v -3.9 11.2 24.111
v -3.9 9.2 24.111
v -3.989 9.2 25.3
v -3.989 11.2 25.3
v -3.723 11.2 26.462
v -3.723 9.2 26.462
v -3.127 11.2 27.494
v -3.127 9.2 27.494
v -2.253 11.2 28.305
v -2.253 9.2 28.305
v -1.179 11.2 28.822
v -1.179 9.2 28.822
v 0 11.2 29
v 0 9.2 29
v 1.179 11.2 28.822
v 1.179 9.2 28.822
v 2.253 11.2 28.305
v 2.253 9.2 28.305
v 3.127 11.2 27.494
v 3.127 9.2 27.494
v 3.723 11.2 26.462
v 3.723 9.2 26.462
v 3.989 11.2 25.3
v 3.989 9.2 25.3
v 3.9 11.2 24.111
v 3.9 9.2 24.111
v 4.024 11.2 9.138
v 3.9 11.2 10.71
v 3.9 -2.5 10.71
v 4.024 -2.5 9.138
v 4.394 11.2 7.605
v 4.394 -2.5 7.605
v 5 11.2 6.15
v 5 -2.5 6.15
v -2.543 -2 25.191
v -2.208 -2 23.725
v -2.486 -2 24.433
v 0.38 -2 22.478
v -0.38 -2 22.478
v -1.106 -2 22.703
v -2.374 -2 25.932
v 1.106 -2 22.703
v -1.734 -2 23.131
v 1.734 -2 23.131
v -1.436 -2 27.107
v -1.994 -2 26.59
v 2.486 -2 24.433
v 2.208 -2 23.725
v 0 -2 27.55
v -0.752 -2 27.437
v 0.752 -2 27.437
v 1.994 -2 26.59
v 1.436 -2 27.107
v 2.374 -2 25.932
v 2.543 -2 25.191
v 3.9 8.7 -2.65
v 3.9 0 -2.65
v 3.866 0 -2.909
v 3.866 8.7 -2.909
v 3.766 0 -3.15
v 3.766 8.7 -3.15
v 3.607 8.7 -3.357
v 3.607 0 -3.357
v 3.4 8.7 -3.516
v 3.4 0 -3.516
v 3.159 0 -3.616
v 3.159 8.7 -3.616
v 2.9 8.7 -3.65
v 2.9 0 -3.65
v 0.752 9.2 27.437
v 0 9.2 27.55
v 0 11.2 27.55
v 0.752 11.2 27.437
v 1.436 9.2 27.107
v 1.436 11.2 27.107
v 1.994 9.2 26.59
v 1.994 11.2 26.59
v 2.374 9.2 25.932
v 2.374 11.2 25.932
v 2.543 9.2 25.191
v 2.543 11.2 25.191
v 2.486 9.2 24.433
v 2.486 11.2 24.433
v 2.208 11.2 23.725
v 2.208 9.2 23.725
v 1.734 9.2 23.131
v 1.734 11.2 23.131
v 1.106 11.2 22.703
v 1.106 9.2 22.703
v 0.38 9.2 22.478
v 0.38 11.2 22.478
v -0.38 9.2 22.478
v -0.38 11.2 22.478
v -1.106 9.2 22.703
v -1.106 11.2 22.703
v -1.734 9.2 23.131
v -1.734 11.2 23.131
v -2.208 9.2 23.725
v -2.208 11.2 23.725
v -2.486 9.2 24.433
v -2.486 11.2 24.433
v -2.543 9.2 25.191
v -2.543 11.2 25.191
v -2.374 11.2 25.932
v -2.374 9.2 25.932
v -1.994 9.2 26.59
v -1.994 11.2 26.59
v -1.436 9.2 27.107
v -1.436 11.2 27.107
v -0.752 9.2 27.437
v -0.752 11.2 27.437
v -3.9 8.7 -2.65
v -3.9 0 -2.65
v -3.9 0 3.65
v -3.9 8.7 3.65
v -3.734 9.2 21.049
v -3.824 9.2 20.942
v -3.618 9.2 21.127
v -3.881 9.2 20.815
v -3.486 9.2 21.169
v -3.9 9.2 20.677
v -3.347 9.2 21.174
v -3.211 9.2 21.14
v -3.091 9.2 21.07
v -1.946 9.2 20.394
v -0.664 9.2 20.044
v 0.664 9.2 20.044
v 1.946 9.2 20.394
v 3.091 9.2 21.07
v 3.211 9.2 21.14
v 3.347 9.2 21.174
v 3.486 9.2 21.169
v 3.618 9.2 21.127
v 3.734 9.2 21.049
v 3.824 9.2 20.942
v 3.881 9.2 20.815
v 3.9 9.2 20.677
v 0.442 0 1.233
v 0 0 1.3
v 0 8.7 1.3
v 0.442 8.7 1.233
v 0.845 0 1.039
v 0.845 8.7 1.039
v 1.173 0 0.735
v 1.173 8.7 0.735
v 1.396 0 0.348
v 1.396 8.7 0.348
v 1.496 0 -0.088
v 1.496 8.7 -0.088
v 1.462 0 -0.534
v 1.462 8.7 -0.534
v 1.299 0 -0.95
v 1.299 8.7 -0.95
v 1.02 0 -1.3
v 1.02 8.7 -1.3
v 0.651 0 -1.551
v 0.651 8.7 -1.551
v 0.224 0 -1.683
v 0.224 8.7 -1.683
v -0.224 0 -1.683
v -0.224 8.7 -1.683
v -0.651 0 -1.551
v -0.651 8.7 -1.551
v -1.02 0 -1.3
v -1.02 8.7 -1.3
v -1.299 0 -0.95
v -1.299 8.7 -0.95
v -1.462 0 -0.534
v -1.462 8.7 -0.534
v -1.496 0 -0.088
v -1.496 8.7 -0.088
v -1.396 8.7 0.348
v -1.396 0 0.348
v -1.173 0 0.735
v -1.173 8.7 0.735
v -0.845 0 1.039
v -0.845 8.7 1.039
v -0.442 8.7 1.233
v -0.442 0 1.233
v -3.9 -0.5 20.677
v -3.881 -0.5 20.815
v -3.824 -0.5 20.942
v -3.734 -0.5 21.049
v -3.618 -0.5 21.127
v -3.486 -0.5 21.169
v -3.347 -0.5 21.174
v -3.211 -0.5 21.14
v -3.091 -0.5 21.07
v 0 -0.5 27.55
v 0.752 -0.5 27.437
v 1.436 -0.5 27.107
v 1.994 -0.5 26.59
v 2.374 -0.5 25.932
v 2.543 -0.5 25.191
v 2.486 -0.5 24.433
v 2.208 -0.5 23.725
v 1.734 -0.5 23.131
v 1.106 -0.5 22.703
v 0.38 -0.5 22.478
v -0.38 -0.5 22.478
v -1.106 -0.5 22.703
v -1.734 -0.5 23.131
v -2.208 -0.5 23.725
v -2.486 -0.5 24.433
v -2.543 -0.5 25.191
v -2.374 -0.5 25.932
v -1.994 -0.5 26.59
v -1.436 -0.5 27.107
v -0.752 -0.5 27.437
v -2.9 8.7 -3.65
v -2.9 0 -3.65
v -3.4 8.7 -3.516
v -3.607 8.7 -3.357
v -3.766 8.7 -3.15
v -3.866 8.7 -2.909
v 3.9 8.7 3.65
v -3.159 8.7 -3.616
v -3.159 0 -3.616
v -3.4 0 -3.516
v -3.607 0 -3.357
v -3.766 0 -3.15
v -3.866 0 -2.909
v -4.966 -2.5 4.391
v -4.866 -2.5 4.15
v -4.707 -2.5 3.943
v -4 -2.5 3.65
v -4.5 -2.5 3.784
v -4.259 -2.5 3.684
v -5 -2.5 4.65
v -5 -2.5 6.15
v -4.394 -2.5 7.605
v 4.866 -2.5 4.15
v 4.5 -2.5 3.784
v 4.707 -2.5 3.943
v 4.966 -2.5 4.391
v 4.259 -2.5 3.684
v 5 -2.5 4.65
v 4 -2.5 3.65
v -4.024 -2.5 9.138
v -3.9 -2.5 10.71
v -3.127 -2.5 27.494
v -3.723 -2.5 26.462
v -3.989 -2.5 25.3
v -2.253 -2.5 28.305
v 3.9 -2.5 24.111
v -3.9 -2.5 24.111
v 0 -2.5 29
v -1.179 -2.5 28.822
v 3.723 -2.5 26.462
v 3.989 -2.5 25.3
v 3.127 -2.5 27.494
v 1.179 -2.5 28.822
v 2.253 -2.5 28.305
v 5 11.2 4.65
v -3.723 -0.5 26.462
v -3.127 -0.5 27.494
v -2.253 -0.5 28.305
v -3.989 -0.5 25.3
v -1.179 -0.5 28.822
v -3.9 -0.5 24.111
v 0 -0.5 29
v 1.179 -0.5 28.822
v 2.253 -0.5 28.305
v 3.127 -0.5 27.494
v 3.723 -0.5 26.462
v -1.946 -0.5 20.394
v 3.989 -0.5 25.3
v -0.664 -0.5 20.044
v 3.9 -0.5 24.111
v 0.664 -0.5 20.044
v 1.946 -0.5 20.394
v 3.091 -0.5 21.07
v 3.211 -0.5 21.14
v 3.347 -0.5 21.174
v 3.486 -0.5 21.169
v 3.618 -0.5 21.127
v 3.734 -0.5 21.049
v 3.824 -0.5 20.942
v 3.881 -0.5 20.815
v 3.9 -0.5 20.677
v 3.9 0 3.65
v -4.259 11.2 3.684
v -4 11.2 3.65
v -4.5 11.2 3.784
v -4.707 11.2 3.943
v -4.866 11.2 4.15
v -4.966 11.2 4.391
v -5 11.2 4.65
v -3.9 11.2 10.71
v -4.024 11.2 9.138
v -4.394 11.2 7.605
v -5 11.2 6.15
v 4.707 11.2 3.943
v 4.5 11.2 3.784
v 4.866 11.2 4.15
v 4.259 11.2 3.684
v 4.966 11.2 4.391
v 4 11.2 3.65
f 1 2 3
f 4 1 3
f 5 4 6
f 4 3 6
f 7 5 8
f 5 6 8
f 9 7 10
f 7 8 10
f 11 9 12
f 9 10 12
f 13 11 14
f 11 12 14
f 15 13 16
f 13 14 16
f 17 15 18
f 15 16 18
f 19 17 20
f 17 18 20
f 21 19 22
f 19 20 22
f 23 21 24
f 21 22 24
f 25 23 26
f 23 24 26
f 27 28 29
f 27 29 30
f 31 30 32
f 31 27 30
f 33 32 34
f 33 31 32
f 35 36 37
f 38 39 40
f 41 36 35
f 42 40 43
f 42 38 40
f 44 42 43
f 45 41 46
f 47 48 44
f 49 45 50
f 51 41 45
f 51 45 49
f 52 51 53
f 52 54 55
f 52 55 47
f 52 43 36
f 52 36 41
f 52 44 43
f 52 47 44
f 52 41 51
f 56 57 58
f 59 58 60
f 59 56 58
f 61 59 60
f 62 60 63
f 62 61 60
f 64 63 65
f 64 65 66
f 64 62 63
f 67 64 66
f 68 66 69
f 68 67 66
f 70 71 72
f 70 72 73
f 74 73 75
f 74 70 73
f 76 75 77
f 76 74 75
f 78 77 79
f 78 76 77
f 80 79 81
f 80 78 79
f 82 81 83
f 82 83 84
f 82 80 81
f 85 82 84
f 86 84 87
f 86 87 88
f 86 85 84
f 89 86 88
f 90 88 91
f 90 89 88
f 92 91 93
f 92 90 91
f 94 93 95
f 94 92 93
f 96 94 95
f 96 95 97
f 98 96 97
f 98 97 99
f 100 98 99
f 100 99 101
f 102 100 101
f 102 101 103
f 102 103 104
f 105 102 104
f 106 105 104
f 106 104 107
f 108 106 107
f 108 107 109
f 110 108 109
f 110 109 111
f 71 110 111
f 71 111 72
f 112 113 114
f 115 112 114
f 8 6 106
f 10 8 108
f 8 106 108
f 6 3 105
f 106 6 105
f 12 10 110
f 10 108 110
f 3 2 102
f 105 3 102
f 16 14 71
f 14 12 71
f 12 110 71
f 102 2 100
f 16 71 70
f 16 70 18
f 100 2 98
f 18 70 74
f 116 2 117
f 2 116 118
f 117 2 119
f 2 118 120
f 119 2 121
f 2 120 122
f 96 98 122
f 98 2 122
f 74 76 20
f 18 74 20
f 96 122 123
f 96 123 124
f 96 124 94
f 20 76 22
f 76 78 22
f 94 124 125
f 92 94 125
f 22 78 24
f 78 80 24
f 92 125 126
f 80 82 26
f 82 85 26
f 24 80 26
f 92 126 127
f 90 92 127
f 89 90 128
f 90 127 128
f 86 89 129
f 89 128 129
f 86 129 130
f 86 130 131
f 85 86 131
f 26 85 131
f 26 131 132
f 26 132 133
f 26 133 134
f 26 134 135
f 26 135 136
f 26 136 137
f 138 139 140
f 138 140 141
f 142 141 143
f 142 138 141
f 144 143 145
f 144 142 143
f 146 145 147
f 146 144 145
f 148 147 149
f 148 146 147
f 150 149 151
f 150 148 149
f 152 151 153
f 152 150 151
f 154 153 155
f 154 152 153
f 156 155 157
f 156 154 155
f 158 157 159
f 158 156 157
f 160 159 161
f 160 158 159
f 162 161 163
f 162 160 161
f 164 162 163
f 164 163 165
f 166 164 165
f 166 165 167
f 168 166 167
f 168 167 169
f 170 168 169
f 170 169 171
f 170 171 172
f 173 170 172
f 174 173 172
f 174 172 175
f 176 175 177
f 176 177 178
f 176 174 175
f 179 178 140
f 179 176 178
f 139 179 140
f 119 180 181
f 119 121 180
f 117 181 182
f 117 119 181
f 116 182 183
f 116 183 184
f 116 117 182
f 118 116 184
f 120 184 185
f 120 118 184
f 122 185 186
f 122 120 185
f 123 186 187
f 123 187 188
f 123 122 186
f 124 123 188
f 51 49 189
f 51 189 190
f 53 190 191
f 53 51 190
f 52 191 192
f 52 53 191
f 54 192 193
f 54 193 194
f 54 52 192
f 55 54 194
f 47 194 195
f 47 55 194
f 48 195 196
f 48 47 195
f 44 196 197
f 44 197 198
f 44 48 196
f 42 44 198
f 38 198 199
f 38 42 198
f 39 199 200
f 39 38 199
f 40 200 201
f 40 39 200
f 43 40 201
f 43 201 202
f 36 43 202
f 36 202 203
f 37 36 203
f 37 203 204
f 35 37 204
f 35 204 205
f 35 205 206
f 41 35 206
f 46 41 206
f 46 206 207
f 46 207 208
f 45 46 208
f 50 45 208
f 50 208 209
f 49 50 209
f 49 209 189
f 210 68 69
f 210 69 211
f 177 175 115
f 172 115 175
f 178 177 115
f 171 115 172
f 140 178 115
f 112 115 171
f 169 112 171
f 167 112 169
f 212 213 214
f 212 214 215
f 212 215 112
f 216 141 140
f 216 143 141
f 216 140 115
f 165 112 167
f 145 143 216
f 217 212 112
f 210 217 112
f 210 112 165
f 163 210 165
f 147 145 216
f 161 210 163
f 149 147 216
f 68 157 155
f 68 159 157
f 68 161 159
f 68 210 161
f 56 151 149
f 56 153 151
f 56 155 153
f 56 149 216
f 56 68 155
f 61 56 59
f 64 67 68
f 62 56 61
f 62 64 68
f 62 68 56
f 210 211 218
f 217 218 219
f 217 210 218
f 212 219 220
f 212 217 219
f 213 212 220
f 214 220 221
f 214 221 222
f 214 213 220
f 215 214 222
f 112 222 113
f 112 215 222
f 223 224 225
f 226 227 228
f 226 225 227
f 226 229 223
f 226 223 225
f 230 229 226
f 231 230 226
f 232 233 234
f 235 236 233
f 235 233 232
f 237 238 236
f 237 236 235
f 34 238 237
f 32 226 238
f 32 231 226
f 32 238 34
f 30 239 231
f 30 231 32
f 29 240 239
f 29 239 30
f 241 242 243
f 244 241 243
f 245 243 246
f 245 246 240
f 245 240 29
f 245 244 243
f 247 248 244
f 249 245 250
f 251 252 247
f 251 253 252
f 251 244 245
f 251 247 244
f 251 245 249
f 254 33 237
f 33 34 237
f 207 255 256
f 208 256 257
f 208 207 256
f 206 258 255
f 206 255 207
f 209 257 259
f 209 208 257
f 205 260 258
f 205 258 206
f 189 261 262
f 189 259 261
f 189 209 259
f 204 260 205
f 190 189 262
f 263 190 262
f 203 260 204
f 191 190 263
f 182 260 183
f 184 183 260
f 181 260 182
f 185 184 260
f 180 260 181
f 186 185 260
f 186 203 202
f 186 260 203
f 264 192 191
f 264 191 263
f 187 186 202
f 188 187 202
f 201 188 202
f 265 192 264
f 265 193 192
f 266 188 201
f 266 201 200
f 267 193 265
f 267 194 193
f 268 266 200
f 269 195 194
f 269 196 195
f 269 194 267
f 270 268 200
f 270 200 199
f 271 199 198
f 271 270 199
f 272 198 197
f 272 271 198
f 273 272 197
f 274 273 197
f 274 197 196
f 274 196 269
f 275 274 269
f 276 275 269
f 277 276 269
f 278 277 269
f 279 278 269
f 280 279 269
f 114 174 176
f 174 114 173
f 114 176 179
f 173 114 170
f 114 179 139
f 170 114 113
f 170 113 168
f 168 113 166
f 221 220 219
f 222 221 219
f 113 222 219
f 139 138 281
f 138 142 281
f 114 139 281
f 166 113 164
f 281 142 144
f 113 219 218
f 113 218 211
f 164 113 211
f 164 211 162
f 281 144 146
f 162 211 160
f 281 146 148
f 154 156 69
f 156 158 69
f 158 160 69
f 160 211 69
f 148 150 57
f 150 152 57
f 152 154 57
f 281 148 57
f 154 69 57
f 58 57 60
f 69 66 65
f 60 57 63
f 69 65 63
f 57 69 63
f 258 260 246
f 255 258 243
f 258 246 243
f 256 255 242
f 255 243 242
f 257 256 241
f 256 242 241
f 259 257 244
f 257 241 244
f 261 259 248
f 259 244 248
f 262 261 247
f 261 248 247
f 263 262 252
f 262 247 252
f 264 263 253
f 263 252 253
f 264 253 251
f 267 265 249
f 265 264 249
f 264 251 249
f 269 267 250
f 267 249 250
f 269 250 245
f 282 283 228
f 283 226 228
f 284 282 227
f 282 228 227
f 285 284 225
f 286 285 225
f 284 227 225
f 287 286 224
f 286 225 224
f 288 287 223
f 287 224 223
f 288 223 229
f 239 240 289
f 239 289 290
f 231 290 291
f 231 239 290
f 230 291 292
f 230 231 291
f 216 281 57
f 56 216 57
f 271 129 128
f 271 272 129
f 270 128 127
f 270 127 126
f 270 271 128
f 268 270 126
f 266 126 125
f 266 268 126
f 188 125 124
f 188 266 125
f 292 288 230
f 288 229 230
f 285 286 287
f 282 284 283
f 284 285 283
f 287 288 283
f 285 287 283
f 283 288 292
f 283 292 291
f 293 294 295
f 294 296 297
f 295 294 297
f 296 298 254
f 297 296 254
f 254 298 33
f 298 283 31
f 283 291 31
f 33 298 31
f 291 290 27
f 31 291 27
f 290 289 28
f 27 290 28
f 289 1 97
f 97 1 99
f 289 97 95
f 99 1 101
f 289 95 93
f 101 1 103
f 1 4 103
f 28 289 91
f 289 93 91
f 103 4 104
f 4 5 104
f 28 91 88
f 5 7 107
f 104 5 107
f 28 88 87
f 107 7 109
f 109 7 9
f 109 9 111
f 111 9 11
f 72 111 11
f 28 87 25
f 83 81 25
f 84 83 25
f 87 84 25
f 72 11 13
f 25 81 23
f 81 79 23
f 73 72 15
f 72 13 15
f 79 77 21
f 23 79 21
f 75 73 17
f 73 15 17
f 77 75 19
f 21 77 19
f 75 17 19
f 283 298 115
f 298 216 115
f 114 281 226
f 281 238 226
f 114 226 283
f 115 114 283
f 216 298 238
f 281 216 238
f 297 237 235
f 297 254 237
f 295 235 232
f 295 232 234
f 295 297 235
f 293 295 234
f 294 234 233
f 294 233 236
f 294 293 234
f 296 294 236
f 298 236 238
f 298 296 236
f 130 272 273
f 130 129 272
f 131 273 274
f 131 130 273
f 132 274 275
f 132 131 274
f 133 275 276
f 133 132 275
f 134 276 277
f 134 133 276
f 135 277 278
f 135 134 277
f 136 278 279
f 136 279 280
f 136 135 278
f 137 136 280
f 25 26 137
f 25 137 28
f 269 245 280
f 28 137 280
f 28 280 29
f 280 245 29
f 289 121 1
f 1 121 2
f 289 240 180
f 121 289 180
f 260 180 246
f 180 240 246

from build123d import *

# Parameters (mm, degrees)
SKETCH2_R           = 1.5
BOSS_EXTRUDE1_DEPTH = 8.7
SKETCH3_R           = 4
SKETCH3_R_2         = 2.55
BOSS_EXTRUDE2_DEPTH = 2.5
BOSS_EXTRUDE3_START = -11.2
SKETCH3_3_R         = 4
SKETCH3_3_R_2       = 2.55
BOSS_EXTRUDE3_DEPTH = 2.5
CUT_EXTRUDE1_START  = -0.5
SKETCH2_3_R         = 5
SKETCH2_3_R_2       = 2.55
CUT_EXTRUDE1_DEPTH  = 9.7
BOSS_EXTRUDE4_START = -2.5
SKETCH2_4_R         = 2.55
BOSS_EXTRUDE4_DEPTH = 0.5
FILLET1_R           = 10
FILLET2_R           = 0.5
FILLET3_R           = 1


with BuildPart() as part:
    # Sketch2 → Boss-Extrude1 (new body)
    with BuildSketch(Plane(origin=(0, 0, 0), x_dir=(1, 0, 0), z_dir=(0, 1, 0))):
        with BuildLine():
            Line((3.9, 3.65), (-3.9, 3.65))
            Line((-3.9, 3.65), (-3.9, -3.65))
            Line((-3.9, -3.65), (-5, -3.65))
            Line((-5, -3.65), (-5, -6.15))
            Line((-5, -6.15), (-3.9, -6.15))
            Line((-3.9, -6.15), (-3.9, -21.871102431))
            ThreePointArc((-3.9, -21.871102431), (0, -20), (3.9, -21.871102431))
            Line((3.9, -21.871102431), (3.9, -6.15))
            Line((3.9, -6.15), (5, -6.15))
            Line((5, -6.15), (5, -3.65))
            Line((5, -3.65), (3.9, -3.65))
            Line((3.9, -3.65), (3.9, 3.65))
        make_face()
        with Locations(Location((0, 0.2, 0), (0, 0, 270))):
            Circle(SKETCH2_R, mode=Mode.SUBTRACT)
    extrude(amount=BOSS_EXTRUDE1_DEPTH)

    # Sketch3 → Boss-Extrude2 (add)
    # profile 1 of 4: a face of its own
    with BuildSketch(Plane(origin=(0, 8.7, 0), x_dir=(1, 0, 0), z_dir=(0, 1, 0))):
        Polygon((-5, -3.65), (-5, -6.15), (-3.9, -6.15), (3.9, -6.15), (5, -6.15), (5, -3.65), (3.9, -3.65), (-3.9, -3.65), align=None)
    # profile 2 of 4: a face of its own
    with BuildSketch(Plane(origin=(0, 8.7, 0), x_dir=(1, 0, 0), z_dir=(0, 1, 0))):
        with BuildLine():
            Line((3.9, -6.15), (-3.9, -6.15))
            Line((-3.9, -6.15), (-3.9, -21.871102431))
            ThreePointArc((-3.9, -21.871102431), (0, -20), (3.9, -21.871102431))
            Line((3.9, -21.871102431), (3.9, -6.15))
        make_face()
    # profile 3 of 4: a face of its own
    with BuildSketch(Plane(origin=(0, 8.7, 0), x_dir=(1, 0, 0), z_dir=(0, 1, 0))):
        with Locations((0, -25)):
            Circle(SKETCH3_R)
        with Locations(Location((0, -25, 0), (0, 0, 270))):
            Circle(SKETCH3_R_2, mode=Mode.SUBTRACT)
    # profile 4 of 4: a face of its own
    with BuildSketch(Plane(origin=(0, 8.7, 0), x_dir=(1, 0, 0), z_dir=(0, 1, 0))):
        with BuildLine():
            ThreePointArc((3.9, -21.871102431), (0, -20), (-3.9, -21.871102431))
            Line((-3.9, -21.871102431), (-3.9, -24.111180558))
            ThreePointArc((-3.9, -24.111180558), (0, -21), (3.9, -24.111180558))
            Line((3.9, -24.111180558), (3.9, -21.871102431))
        make_face()
    extrude(amount=BOSS_EXTRUDE2_DEPTH)

    # Sketch3<3> → Boss-Extrude3 (add)
    # profile 1 of 4: a face of its own
    with BuildSketch(Plane(origin=(0, 8.7, 0), x_dir=(1, 0, 0), z_dir=(0, 1, 0)).offset(BOSS_EXTRUDE3_START)):
        with Locations((0, -25)):
            Circle(SKETCH3_3_R)
        with Locations(Location((0, -25, 0), (0, 0, 270))):
            Circle(SKETCH3_3_R_2, mode=Mode.SUBTRACT)
    # profile 2 of 4: a face of its own
    with BuildSketch(Plane(origin=(0, 8.7, 0), x_dir=(1, 0, 0), z_dir=(0, 1, 0)).offset(BOSS_EXTRUDE3_START)):
        with BuildLine():
            ThreePointArc((3.9, -21.871102431), (0, -20), (-3.9, -21.871102431))
            Line((-3.9, -21.871102431), (-3.9, -24.111180558))
            ThreePointArc((-3.9, -24.111180558), (0, -21), (3.9, -24.111180558))
            Line((3.9, -24.111180558), (3.9, -21.871102431))
        make_face()
    # profile 3 of 4: a face of its own
    with BuildSketch(Plane(origin=(0, 8.7, 0), x_dir=(1, 0, 0), z_dir=(0, 1, 0)).offset(BOSS_EXTRUDE3_START)):
        with BuildLine():
            Line((3.9, -6.15), (-3.9, -6.15))
            Line((-3.9, -6.15), (-3.9, -21.871102431))
            ThreePointArc((-3.9, -21.871102431), (0, -20), (3.9, -21.871102431))
            Line((3.9, -21.871102431), (3.9, -6.15))
        make_face()
    # profile 4 of 4: a face of its own
    with BuildSketch(Plane(origin=(0, 8.7, 0), x_dir=(1, 0, 0), z_dir=(0, 1, 0)).offset(BOSS_EXTRUDE3_START)):
        Polygon((-5, -3.65), (-5, -6.15), (-3.9, -6.15), (3.9, -6.15), (5, -6.15), (5, -3.65), (3.9, -3.65), (-3.9, -3.65), align=None)
    extrude(amount=BOSS_EXTRUDE3_DEPTH)

    # Sketch2<3> → Cut-Extrude1 (cut)
    with BuildSketch(Plane(origin=(0, 0, 0), x_dir=(1, 0, 0), z_dir=(0, 1, 0)).offset(CUT_EXTRUDE1_START)):
        with Locations((0, -25)):
            Circle(SKETCH2_3_R)
        with Locations(Location((0, -25, 0), (0, 0, 270))):
            Circle(SKETCH2_3_R_2, mode=Mode.SUBTRACT)
    extrude(amount=CUT_EXTRUDE1_DEPTH, mode=Mode.SUBTRACT)

    # Sketch2<4> → Boss-Extrude4 (add)
    with BuildSketch(Plane(origin=(0, 0, 0), x_dir=(1, 0, 0), z_dir=(0, 1, 0)).offset(BOSS_EXTRUDE4_START)):
        with Locations(Location((0, -25, 0), (0, 0, 270))):
            Circle(SKETCH2_4_R)
    extrude(amount=BOSS_EXTRUDE4_DEPTH)

    # Fillet1
    # the kernel refuses this fillet: 10 mm, written as the material it adds along each edge
    with BuildSketch(Plane(origin=(-3.9, -2.5, 6.15), x_dir=(-1, 0, 0), z_dir=(0, 1, 0)), Plane(origin=(3.9, 11.2, 6.15), x_dir=(1, 0, 0), z_dir=(0, -1, 0))) as fillet1_piece_1:
        with BuildLine():
            CenterArc((10, 4.559605246), FILLET1_R, 180, 27.126753117)
            Line((0, 4.559605246), (-0.2, 4.559605246))
            Line((-0.2, 4.559605246), (-0.2, 0))
            Line((-0.2, 0), (0, -0.2))
            ThreePointArc((0, -0.2), (0.55, -0.2), (0.922, -0.091192105))
            Line((0.922, -0.091192105), (1.1, 0))
        make_face()
    extrude(amount=13.7)

    # Fillet2
    fillet2_edges = [part.edges().sort_by_distance(p)[0] for p in [
        (3.9, 4.35, 21.871102431),
        (-3.9, 4.35, 21.871102431),
    ]]
    fillet(fillet2_edges, radius=FILLET2_R)

    # Fillet3
    fillet3_edges = [part.edges().sort_by_distance(p)[0] for p in [
        (5, 4.35, 3.65),
        (-5, 4.35, 3.65),
        (-3.9, 4.35, -3.65),
        (3.9, 4.35, -3.65),
    ]]
    fillet(fillet3_edges, radius=FILLET3_R)


solid = part.part
